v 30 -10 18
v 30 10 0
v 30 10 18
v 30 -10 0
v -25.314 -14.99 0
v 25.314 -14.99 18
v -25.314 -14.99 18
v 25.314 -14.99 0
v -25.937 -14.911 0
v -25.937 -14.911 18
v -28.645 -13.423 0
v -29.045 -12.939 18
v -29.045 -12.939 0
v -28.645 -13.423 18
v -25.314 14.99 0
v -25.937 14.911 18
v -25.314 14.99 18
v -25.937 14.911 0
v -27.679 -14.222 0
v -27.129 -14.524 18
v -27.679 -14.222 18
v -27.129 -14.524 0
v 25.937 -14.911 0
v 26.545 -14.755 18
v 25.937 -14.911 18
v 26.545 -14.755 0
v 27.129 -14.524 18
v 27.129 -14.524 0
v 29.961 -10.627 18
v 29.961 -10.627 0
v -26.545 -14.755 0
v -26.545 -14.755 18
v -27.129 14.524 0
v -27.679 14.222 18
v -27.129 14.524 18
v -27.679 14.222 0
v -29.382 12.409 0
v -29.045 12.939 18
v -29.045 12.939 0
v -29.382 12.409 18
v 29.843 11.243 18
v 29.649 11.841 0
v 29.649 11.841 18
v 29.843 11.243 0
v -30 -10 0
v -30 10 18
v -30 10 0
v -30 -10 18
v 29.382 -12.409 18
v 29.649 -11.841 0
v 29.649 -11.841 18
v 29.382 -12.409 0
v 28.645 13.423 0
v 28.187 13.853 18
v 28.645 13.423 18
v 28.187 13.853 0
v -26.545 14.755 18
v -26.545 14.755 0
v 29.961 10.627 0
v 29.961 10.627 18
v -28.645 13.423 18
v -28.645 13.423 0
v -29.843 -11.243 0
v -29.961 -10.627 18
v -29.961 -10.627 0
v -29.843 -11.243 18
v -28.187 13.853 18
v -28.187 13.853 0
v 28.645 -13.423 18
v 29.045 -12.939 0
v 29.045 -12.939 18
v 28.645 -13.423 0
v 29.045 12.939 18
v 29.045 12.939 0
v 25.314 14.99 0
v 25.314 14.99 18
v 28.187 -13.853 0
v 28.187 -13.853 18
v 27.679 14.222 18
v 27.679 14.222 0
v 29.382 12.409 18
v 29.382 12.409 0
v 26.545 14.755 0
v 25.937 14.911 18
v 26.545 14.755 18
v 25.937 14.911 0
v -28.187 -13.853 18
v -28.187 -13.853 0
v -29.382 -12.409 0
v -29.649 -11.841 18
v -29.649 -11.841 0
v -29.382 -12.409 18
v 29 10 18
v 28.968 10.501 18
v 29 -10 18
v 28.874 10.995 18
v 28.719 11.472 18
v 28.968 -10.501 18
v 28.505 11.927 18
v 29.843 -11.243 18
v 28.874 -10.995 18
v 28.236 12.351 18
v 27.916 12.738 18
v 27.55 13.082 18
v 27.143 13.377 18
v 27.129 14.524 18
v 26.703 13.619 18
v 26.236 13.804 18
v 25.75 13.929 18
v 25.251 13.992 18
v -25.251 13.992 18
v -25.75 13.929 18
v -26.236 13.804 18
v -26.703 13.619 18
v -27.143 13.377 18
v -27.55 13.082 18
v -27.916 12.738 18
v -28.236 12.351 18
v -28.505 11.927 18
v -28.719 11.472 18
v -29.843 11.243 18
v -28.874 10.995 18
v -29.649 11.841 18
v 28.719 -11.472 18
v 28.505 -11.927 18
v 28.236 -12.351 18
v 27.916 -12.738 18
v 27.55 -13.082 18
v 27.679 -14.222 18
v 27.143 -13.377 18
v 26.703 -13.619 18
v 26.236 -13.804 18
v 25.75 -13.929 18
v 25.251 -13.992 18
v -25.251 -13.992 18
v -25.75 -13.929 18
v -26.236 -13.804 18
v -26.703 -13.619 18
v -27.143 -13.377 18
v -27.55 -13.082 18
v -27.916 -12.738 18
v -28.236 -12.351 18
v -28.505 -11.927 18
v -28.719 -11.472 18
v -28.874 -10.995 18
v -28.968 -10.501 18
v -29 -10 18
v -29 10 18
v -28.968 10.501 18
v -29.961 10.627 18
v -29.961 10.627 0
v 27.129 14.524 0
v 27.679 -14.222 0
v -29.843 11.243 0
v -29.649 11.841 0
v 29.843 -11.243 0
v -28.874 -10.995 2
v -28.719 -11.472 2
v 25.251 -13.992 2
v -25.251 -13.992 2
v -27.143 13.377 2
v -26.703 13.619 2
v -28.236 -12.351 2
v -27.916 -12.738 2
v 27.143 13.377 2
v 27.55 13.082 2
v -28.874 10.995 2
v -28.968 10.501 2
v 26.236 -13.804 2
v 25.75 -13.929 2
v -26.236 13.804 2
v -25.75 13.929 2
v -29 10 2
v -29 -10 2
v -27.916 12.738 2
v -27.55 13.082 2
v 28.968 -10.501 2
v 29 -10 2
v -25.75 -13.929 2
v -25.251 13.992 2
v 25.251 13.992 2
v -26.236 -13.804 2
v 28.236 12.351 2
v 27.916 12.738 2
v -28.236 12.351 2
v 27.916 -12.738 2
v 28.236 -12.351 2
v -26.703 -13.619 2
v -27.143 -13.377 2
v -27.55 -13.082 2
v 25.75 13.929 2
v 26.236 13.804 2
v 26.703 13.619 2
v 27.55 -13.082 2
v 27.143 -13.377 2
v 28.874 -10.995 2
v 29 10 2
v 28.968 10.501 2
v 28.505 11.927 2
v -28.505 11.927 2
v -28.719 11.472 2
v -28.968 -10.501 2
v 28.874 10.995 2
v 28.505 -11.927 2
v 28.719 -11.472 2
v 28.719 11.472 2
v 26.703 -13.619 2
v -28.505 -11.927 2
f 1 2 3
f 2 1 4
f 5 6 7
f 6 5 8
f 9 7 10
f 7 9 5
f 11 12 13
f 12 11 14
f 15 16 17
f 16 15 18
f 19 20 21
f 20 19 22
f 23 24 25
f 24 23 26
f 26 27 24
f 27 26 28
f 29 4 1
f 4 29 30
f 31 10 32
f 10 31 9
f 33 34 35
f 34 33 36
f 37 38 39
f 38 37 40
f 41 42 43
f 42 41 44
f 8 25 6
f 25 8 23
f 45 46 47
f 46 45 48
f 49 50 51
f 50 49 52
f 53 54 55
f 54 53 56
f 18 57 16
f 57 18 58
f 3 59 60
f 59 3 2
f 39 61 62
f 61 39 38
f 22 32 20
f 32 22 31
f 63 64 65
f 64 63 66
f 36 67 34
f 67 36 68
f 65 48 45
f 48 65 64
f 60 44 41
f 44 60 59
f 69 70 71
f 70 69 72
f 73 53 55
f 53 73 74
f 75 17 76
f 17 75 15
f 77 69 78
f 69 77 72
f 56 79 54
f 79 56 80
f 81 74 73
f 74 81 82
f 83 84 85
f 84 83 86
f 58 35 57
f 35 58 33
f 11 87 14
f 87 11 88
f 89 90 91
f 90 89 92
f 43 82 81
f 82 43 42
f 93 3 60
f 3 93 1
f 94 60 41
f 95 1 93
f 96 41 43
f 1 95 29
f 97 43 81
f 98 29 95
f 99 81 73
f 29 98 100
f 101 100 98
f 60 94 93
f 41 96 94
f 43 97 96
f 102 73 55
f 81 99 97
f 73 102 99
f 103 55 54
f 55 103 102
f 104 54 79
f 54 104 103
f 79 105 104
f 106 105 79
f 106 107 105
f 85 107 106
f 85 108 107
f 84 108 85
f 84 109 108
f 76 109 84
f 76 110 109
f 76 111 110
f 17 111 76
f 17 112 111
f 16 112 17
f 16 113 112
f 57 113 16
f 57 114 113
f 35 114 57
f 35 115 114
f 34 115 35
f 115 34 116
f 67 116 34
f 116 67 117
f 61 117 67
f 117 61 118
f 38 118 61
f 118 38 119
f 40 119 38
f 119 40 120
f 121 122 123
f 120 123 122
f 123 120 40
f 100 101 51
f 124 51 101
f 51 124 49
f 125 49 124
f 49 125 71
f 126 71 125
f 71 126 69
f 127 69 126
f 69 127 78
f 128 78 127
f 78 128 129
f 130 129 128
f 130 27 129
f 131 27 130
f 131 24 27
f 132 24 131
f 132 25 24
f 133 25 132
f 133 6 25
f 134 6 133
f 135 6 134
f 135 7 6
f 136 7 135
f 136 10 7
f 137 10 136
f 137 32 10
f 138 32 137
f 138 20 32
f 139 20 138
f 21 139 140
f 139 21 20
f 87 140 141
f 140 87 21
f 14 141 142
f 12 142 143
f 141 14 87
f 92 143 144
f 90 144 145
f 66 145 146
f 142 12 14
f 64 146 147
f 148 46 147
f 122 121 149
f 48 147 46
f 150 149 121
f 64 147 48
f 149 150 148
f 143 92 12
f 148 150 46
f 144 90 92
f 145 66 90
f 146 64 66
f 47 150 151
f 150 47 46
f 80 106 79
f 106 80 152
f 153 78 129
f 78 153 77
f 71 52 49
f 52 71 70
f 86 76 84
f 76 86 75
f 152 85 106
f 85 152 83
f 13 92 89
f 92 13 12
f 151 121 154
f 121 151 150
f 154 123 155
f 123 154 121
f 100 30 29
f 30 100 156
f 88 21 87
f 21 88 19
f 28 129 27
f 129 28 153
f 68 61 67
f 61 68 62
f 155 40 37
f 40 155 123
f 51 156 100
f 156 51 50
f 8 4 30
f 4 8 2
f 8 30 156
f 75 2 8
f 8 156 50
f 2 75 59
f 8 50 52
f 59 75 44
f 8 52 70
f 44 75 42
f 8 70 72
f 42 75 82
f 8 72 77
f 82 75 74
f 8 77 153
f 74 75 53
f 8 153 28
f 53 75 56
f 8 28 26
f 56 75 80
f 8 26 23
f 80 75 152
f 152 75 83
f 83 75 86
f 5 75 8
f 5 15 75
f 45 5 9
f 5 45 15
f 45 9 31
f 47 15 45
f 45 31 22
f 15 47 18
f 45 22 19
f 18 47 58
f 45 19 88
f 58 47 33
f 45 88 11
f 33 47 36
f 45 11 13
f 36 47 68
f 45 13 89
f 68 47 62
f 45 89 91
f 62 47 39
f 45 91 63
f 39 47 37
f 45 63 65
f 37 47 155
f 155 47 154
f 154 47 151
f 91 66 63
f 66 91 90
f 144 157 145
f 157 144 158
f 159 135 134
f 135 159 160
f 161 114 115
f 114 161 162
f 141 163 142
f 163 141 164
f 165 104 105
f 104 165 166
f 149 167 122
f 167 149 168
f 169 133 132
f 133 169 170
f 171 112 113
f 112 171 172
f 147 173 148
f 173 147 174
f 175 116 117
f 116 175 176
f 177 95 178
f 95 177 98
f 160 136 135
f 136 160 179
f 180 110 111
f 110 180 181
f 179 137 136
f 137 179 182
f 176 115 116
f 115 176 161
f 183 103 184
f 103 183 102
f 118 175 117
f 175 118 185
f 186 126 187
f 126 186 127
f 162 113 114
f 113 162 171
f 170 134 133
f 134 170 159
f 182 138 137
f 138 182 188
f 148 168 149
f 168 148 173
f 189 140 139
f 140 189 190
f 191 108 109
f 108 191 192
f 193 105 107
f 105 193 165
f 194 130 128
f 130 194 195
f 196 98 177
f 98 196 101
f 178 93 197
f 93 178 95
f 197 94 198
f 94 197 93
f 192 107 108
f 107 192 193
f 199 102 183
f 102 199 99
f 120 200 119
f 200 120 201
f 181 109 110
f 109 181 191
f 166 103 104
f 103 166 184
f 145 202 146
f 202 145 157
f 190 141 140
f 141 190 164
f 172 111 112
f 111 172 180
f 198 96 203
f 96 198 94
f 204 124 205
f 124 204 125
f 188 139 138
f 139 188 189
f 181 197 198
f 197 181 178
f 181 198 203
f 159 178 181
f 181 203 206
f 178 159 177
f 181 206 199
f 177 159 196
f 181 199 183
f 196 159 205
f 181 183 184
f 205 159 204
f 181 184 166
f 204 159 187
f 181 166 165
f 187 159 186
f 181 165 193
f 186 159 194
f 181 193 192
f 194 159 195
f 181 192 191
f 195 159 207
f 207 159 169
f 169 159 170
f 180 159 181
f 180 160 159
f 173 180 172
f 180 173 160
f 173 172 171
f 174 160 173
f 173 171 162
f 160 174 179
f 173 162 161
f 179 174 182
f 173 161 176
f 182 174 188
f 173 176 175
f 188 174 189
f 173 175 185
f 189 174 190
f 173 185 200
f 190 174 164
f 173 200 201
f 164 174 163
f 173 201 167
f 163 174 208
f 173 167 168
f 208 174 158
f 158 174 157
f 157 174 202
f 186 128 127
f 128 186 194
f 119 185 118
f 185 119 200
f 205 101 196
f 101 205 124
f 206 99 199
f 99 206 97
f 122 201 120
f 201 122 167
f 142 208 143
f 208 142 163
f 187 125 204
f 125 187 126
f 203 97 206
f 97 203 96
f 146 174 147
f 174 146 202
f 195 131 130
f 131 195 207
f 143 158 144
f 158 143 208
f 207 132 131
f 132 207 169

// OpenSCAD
$fn = 50;


difference() {
	union() {
		hull() {
			translate(v = [-25.0000000000, 10.0000000000, 0]) {
				cylinder(h = 18, r = 5);
			}
			translate(v = [25.0000000000, 10.0000000000, 0]) {
				cylinder(h = 18, r = 5);
			}
			translate(v = [-25.0000000000, -10.0000000000, 0]) {
				cylinder(h = 18, r = 5);
			}
			translate(v = [25.0000000000, -10.0000000000, 0]) {
				cylinder(h = 18, r = 5);
			}
		}
	}
	union() {
		translate(v = [0, 0, 2]) {
			hull() {
				translate(v = [-25.0000000000, 10.0000000000, 0]) {
					cylinder(h = 16, r = 4);
				}
				translate(v = [25.0000000000, 10.0000000000, 0]) {
					cylinder(h = 16, r = 4);
				}
				translate(v = [-25.0000000000, -10.0000000000, 0]) {
					cylinder(h = 16, r = 4);
				}
				translate(v = [25.0000000000, -10.0000000000, 0]) {
					cylinder(h = 16, r = 4);
				}
			}
		}
	}
}
